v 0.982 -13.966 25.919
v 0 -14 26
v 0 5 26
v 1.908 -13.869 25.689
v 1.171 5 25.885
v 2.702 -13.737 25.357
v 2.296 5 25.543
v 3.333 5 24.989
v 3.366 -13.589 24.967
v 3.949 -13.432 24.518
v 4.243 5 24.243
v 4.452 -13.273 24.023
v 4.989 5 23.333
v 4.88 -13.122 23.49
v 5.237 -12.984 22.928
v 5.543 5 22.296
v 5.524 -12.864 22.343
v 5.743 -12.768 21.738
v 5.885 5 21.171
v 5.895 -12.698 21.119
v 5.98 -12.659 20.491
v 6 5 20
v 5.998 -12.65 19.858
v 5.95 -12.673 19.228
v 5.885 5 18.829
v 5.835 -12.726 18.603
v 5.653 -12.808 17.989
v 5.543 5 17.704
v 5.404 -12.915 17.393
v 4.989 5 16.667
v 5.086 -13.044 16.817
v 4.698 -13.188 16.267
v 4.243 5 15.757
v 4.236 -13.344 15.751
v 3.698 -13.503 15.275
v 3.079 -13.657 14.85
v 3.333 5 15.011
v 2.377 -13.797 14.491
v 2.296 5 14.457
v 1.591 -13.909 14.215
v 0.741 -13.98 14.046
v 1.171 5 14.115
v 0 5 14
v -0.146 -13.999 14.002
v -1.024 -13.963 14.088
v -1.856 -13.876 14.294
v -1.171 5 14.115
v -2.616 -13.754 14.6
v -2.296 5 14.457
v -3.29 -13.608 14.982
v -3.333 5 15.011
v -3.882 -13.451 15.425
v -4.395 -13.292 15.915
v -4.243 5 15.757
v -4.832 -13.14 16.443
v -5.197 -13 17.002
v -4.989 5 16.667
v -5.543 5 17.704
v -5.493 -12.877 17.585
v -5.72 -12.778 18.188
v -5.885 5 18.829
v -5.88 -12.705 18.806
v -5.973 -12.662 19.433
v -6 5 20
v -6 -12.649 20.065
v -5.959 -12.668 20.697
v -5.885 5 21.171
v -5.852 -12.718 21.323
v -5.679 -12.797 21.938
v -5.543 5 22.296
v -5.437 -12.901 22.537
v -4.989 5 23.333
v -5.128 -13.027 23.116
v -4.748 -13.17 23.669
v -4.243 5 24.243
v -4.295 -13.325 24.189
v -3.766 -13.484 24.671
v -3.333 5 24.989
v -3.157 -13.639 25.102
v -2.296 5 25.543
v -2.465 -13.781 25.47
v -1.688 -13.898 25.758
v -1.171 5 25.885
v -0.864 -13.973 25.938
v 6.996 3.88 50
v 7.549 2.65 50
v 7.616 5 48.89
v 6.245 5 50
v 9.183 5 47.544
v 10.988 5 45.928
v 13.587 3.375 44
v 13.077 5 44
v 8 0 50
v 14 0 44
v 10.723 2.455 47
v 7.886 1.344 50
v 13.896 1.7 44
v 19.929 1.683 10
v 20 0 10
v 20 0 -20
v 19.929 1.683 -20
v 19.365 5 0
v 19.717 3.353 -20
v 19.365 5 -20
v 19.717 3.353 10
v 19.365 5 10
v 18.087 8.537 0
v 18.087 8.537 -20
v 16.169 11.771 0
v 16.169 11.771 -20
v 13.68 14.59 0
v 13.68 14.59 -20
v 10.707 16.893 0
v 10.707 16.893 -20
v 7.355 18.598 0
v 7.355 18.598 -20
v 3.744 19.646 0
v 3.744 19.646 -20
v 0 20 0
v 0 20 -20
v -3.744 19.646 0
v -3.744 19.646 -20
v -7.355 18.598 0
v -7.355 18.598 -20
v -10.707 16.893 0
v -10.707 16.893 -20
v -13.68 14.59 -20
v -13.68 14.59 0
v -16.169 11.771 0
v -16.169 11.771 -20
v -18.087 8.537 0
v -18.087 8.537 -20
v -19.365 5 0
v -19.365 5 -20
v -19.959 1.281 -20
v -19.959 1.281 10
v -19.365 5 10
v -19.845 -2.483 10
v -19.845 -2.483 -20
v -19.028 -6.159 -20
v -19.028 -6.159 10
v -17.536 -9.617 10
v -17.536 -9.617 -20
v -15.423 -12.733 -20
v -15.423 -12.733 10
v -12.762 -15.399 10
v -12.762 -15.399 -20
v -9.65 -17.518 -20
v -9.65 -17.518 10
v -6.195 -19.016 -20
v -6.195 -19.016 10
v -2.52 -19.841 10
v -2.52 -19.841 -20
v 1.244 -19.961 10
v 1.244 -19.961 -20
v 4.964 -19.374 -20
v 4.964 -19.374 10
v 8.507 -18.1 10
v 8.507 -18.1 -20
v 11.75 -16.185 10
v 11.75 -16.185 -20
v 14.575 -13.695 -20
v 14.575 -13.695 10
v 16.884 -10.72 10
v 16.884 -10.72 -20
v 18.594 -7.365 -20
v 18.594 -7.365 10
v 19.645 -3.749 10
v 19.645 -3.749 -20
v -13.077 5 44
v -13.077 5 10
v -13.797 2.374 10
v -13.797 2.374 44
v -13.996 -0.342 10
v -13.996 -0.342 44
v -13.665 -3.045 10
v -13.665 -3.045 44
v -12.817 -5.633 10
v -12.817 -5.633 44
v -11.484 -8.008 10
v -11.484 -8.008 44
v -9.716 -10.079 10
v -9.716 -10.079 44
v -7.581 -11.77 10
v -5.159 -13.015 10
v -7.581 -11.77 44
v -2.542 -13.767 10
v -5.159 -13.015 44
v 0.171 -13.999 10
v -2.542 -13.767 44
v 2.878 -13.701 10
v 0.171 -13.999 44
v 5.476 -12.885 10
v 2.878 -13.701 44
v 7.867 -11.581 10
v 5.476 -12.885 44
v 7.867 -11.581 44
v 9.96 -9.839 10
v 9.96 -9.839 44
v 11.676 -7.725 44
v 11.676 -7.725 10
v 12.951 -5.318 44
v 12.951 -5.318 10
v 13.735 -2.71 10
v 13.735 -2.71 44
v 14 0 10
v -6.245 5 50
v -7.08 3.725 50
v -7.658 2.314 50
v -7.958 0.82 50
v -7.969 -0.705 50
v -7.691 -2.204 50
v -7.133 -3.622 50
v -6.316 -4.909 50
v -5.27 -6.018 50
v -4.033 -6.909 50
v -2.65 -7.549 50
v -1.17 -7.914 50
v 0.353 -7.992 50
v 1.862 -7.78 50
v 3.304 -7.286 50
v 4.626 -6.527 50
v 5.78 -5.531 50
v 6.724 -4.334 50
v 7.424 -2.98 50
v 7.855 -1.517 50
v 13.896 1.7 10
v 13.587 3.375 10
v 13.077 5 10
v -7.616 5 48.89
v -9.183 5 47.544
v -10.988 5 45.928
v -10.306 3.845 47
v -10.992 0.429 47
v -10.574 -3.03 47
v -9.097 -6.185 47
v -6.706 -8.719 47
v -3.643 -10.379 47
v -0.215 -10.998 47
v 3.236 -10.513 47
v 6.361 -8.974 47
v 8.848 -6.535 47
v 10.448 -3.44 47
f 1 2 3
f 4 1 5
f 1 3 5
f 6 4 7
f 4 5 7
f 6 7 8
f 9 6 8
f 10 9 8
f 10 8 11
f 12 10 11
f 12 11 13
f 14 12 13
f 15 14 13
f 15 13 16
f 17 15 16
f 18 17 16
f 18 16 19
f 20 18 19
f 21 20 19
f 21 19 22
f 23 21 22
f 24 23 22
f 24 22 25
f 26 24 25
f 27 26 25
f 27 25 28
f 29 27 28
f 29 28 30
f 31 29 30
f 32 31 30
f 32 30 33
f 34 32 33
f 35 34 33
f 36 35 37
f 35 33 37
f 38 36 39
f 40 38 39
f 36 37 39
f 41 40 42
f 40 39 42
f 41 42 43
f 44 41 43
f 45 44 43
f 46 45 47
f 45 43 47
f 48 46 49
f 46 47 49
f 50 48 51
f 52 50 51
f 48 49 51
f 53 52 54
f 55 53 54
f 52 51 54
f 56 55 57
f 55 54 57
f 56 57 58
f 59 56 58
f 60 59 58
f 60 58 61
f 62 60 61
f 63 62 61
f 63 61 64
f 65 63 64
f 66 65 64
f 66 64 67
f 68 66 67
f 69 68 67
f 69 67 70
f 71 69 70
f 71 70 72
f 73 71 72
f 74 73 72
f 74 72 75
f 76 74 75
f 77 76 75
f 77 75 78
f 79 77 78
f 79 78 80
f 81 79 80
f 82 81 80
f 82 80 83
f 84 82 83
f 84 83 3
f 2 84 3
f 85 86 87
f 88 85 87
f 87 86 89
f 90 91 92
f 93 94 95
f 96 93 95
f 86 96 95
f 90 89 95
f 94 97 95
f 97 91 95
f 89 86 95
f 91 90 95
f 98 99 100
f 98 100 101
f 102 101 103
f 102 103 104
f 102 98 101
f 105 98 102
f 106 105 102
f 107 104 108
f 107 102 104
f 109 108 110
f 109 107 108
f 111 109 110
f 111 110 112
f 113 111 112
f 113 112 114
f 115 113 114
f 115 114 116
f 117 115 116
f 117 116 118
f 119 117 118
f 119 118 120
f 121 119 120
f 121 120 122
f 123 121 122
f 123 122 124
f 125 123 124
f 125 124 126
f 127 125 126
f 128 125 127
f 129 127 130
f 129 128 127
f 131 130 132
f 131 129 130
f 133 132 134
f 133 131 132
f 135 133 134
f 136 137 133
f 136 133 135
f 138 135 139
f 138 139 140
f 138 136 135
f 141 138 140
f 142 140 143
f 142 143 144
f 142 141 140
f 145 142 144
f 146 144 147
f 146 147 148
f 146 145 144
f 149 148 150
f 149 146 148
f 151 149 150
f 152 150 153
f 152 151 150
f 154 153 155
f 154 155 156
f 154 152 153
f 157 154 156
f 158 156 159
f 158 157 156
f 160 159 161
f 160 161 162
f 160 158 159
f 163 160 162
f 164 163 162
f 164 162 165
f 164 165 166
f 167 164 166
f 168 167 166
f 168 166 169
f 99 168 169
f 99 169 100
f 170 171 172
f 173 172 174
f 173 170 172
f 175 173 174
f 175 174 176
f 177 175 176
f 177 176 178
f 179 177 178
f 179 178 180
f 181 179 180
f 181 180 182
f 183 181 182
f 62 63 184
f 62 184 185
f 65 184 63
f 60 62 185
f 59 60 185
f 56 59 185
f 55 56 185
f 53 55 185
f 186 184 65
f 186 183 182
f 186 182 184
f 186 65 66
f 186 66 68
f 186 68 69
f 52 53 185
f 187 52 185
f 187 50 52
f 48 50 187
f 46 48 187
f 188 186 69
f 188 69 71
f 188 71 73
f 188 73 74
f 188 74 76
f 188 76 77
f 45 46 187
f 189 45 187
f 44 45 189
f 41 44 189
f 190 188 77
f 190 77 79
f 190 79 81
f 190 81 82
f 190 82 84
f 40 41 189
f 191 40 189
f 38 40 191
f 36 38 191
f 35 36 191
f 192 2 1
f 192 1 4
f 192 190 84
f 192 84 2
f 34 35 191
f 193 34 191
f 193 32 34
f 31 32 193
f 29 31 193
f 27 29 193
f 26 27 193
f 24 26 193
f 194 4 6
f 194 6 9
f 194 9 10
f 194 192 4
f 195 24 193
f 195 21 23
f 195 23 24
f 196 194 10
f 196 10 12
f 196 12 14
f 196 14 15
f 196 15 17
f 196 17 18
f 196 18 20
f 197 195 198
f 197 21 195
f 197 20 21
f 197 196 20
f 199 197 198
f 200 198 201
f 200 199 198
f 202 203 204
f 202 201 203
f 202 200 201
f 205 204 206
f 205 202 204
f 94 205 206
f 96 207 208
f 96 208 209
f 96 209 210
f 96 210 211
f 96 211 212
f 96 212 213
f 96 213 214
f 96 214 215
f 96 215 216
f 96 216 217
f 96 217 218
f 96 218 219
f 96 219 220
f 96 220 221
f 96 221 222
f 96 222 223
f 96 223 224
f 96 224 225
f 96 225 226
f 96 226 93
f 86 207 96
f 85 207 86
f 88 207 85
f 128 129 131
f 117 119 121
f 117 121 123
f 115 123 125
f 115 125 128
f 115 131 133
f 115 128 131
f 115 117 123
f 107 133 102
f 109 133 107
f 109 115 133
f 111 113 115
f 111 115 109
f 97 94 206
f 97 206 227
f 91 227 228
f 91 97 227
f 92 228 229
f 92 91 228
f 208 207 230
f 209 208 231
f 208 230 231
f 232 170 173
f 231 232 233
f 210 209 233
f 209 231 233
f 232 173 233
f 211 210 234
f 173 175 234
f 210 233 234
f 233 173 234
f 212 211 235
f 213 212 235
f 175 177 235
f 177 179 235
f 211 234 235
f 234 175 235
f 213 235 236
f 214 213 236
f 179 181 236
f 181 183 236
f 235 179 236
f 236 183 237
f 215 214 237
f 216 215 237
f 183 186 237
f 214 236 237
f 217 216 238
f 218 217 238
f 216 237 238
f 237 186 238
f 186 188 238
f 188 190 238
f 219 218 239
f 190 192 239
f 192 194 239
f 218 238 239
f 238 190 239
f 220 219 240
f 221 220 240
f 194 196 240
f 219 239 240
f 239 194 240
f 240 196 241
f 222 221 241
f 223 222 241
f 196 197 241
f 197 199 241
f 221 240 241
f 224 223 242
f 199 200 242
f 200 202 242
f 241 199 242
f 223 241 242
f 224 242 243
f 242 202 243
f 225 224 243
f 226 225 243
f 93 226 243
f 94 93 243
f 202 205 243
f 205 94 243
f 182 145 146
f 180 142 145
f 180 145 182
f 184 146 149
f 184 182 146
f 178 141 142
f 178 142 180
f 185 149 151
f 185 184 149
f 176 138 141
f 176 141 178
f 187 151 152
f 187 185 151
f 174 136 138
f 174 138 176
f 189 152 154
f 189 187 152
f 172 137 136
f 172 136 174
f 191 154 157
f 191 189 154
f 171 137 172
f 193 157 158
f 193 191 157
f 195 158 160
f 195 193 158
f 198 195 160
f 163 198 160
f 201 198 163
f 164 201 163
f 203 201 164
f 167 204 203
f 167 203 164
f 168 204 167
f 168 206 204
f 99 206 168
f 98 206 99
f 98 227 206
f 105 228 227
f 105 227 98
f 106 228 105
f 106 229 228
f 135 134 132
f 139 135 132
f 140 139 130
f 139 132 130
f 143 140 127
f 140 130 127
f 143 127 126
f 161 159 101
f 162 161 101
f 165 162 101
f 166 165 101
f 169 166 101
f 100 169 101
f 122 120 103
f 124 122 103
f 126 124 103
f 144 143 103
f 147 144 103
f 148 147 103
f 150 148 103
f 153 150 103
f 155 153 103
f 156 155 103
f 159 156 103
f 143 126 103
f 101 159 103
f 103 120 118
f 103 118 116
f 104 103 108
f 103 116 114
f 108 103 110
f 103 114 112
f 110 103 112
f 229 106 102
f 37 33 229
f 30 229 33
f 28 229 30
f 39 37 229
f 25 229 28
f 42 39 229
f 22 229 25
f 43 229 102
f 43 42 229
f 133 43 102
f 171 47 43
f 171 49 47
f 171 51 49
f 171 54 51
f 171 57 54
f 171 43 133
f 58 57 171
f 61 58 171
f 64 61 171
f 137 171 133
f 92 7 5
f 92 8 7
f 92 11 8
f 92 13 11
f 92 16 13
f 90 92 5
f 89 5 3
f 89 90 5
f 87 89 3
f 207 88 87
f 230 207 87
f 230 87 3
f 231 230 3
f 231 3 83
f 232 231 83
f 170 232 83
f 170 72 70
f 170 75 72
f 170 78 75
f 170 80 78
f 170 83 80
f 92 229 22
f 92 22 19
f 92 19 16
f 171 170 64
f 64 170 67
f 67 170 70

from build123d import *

# Parameters (mm, degrees)
SKETCH1_R           = 20
BOSS_EXTRUDE1_DEPTH = 20
BOSS_EXTRUDE2_START = 10
BOSS_EXTRUDE2_DEPTH = 10
BOSS_EXTRUDE3_START = 50
BOSS_EXTRUDE3_DEPTH = 50
CHAMFER3_SIZE       = 6
SKETCH3_R           = 6
CUT_EXTRUDE1_DEPTH  = 50


with BuildPart() as part:
    # Sketch1 → Boss-Extrude1 (new body)
    with BuildSketch(Plane.XY):
        Circle(SKETCH1_R)
    extrude(amount=-BOSS_EXTRUDE1_DEPTH)

    # Sketch1<4> → Boss-Extrude2 (add)
    with BuildSketch(Plane.XY.offset(BOSS_EXTRUDE2_START)):
        with BuildLine():
            Line((-13.076696831, 5), (-19.364916731, 5))
            ThreePointArc((-19.364916731, 5), (-2.52008585, -19.840593925), (20, 0))
            ThreePointArc((20, 0), (19.840593925, 2.52008585), (19.364916731, 5))
            Line((19.364916731, 5), (13.076696831, 5))
            ThreePointArc((13.076696831, 5), (13.767239295, 2.542267135), (14, 0))
            ThreePointArc((14, 0), (-2.542267135, -13.767239295), (-13.076696831, 5))
        make_face()
    extrude(amount=-BOSS_EXTRUDE2_DEPTH)

    # Sketch1<5> → Boss-Extrude3 (add)
    with BuildSketch(Plane.XY.offset(BOSS_EXTRUDE3_START)):
        with BuildLine():
            Line((13.076696831, 5), (-13.076696831, 5))
            ThreePointArc((-13.076696831, 5), (-2.542267135, -13.767239295), (14, 0))
            ThreePointArc((14, 0), (13.767239295, 2.542267135), (13.076696831, 5))
        make_face()
    extrude(amount=-BOSS_EXTRUDE3_DEPTH)

    # Chamfer3
    chamfer3_edges = [part.edges().sort_by_distance(p)[0] for p in [
        (-2.542267135, -13.767239295, 50),
    ]]
    chamfer(chamfer3_edges, length=CHAMFER3_SIZE)

    # Sketch3 → Cut-Extrude1 (cut)
    with BuildSketch(Plane(origin=(0, 5, 0), x_dir=(1, 0, 0), z_dir=(0, 1, 0))):
        with Locations((0, -20)):
            Circle(SKETCH3_R)
    extrude(amount=-CUT_EXTRUDE1_DEPTH, mode=Mode.SUBTRACT)


solid = part.part
